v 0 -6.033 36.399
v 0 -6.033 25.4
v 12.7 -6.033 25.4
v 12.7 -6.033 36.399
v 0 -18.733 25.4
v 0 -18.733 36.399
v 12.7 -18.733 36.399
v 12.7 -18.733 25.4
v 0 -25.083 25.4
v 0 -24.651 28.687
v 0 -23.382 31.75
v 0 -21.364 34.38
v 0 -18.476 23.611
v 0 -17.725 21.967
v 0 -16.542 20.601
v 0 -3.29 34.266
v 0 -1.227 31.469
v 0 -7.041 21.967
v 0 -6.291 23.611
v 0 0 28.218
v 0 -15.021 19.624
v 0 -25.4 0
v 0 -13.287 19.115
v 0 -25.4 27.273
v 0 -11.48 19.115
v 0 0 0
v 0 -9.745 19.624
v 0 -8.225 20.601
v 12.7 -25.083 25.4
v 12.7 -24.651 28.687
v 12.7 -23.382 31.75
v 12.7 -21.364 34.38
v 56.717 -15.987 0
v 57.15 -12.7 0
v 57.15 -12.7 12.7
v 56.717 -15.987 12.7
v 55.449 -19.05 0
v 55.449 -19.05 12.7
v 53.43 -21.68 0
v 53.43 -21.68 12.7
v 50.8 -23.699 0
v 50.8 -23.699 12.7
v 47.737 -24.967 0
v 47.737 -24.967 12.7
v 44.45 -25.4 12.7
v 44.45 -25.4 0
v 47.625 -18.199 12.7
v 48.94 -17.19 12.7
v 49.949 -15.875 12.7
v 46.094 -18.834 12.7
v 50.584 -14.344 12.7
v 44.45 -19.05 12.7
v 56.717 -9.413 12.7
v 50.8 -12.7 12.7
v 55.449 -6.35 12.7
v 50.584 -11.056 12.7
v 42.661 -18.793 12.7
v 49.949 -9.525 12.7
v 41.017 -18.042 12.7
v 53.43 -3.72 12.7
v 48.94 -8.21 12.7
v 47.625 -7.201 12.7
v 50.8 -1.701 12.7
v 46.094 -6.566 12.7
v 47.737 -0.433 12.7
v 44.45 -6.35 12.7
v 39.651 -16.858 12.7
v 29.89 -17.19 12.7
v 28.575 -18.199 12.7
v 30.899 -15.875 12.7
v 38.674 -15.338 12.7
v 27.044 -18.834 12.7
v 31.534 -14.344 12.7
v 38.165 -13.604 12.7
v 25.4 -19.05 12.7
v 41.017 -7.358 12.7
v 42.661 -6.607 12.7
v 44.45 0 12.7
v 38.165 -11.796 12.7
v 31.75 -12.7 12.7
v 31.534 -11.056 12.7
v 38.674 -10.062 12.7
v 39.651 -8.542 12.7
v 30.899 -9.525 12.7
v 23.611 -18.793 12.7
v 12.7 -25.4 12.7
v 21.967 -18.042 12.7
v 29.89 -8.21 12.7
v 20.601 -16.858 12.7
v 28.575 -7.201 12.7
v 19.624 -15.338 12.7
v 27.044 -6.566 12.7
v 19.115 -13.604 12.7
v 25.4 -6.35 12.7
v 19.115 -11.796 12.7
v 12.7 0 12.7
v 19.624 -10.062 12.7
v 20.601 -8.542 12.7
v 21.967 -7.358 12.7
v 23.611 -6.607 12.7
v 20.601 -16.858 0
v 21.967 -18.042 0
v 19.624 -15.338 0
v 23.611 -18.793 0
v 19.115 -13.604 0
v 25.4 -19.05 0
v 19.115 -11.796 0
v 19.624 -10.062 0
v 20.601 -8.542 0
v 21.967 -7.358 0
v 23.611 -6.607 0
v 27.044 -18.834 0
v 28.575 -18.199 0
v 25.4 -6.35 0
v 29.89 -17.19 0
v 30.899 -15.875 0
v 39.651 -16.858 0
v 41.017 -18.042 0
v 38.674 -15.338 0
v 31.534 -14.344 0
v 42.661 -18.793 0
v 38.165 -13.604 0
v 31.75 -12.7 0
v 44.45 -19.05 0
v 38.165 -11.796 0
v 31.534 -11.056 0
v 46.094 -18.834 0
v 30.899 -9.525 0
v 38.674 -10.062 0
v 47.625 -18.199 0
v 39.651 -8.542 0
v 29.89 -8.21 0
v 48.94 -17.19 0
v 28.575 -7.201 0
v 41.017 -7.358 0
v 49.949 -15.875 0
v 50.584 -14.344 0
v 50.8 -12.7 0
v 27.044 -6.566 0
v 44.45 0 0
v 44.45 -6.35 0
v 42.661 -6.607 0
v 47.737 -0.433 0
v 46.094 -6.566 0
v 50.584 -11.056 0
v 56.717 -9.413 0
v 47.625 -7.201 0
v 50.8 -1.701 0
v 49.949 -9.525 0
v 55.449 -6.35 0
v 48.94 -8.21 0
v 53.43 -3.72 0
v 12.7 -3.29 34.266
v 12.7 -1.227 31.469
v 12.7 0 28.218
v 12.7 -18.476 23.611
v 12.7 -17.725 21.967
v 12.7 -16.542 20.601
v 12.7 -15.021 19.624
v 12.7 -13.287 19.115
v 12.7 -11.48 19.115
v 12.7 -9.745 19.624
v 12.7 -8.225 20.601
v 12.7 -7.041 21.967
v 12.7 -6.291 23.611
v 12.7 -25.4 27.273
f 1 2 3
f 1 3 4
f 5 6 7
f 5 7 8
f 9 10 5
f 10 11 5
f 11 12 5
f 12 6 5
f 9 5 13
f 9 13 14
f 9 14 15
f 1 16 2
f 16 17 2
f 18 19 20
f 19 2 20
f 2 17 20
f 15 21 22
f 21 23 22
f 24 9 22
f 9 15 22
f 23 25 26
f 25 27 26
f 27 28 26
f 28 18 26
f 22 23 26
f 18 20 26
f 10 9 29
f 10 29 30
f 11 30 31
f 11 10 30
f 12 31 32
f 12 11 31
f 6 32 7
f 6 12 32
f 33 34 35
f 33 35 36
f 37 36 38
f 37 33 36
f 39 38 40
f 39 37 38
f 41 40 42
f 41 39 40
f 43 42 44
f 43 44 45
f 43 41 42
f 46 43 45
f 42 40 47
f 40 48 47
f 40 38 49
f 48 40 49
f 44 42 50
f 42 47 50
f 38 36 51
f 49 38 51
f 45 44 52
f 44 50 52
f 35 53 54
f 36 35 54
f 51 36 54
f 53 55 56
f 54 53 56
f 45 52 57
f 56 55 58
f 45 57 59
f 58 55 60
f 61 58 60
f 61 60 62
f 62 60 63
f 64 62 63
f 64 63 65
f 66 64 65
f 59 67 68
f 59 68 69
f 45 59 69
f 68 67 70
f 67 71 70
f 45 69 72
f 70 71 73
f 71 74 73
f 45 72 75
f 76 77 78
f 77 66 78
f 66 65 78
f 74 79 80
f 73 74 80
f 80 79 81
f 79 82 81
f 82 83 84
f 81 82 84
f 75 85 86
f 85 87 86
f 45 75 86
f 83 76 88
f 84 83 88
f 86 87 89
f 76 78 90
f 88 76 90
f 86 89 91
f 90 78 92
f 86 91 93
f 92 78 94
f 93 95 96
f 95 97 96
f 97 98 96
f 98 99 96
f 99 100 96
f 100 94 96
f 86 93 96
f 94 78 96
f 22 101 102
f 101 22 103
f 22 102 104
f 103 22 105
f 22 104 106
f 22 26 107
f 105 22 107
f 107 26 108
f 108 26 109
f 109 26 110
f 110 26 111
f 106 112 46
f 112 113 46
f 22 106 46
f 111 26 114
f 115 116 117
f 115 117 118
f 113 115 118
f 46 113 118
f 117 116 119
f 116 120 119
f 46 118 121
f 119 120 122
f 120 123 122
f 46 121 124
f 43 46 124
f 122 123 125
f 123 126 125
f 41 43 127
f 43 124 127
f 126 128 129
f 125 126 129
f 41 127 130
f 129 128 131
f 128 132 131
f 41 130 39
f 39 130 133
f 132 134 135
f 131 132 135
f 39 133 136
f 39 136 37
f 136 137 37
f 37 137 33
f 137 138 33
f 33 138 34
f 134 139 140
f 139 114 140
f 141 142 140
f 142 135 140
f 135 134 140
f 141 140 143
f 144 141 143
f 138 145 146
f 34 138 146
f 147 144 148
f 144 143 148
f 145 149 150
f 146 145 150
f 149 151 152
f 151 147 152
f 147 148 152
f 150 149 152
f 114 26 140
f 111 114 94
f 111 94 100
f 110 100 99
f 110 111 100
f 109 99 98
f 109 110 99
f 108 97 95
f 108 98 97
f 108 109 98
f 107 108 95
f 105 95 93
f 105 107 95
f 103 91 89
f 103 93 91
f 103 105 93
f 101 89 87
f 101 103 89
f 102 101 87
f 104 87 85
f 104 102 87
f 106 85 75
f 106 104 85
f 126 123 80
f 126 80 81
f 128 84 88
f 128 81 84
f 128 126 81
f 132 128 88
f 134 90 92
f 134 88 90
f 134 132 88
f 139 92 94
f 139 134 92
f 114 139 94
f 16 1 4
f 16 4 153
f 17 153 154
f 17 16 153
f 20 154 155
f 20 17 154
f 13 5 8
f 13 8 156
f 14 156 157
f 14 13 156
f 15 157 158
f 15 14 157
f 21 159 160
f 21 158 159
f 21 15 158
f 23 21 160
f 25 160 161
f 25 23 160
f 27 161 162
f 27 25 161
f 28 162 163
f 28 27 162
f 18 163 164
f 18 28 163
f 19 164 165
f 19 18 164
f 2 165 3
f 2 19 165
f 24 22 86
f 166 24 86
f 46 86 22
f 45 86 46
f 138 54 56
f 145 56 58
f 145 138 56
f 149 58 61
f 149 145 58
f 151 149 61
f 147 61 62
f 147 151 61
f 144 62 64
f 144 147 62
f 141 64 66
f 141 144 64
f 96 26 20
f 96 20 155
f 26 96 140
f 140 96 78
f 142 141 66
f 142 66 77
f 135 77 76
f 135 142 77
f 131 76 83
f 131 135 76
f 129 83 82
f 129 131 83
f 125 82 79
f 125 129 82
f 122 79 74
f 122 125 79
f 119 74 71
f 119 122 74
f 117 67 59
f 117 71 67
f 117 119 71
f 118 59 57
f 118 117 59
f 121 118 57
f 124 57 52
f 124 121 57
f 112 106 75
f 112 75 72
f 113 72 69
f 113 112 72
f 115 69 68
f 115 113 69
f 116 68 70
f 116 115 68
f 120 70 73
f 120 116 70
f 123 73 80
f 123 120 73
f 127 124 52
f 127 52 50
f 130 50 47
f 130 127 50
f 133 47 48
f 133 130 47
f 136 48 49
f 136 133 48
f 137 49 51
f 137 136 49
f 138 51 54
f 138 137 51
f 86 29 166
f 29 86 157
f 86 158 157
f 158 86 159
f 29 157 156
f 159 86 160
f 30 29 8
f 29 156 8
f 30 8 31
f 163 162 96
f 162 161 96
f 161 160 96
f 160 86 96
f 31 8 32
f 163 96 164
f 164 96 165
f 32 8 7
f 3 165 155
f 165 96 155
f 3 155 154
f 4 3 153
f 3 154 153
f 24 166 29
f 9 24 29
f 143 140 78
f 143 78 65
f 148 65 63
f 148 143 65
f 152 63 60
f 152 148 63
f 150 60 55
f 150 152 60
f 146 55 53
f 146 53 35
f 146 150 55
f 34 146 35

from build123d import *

# Parameters (mm, degrees)
F1_DEPTH = 25.4
F3_DEPTH = 25.4
F5_DEPTH = 25.4


# Not quite as in the source:
# - a feature names something its author has since deleted; it is built from what else it names


with BuildPart() as f1:
    # F0 (on Front) → F1 (new body)
    with BuildSketch(Plane.XZ):
        Polygon((0, 38.1), (0, 0), (57.15, 0), (57.15, 12.7), (12.7, 12.7), (12.7, 38.1), align=None)
    extrude(amount=F1_DEPTH)

    # F2 (on Top) → F3 (cut)
    with BuildSketch(Plane.XY):
        with BuildLine():
            Line((25.4, -19.05), (25.4, -6.35))
            ThreePointArc((25.4, -6.35), (19.05, -12.7), (25.4, -19.05))
        make_face()
        with BuildLine():
            ThreePointArc((25.4, -19.05), (29.8901280605, -17.1901280605), (31.75, -12.7))
            ThreePointArc((31.75, -12.7), (29.8901280605, -8.2098719395), (25.4, -6.35))
            Line((25.4, -6.35), (25.4, -19.05))
        make_face()
        with BuildLine():
            Line((44.45, -19.05), (44.45, -6.35))
            ThreePointArc((44.45, -6.35), (38.1, -12.7), (44.45, -19.05))
        make_face()
        with BuildLine():
            ThreePointArc((50.8, -12.7), (48.9401280605, -8.2098719395), (44.45, -6.35))
            Line((44.45, -6.35), (44.45, -19.05))
            ThreePointArc((44.45, -19.05), (48.9401280605, -17.1901280605), (50.8, -12.7))
        make_face()
        with BuildLine():
            Line((57.15, -25.4), (57.15, -12.7))
            ThreePointArc((57.15, -12.7), (53.4302561211, -21.6802561211), (44.45, -25.4))
            Line((44.45, -25.4), (57.15, -25.4))
        make_face()
        with BuildLine():
            Line((57.15, 0), (44.45, 0))
            ThreePointArc((44.45, 0), (53.4302561211, -3.7197438789), (57.15, -12.7))
            Line((57.15, -12.7), (57.15, 0))
        make_face()
    extrude(amount=F3_DEPTH, mode=Mode.SUBTRACT)

    # F4 (on Right) → F5 (cut)
    with BuildSketch(Plane.YZ):
        with BuildLine():
            ThreePointArc((-18.7333624887, 25.4), (-12.3833624887, 19.05), (-6.0333624887, 25.4))
            ThreePointArc((-6.0333624887, 25.4), (-12.3833624887, 31.75), (-18.7333624887, 25.4))
        make_face()
        with BuildLine():
            ThreePointArc((-18.7333624887, 25.4), (-12.3833624887, 31.75), (-6.0333624887, 25.4))
            Line((-6.0333624887, 25.4), (-6.0333624887, 36.3985226281))
            ThreePointArc((-6.0333624887, 36.3985226281), (-9.0963606159, 37.6672579939), (-12.3833624887, 38.1))
            ThreePointArc((-12.3833624887, 38.1), (-15.6703643615, 37.6672579939), (-18.7333624887, 36.3985226281))
            Line((-18.7333624887, 36.3985226281), (-18.7333624887, 25.4))
        make_face()
        with BuildLine():
            ThreePointArc((-12.3833624887, 38.1), (-9.0963606159, 37.6672579939), (-6.0333624887, 36.3985226281))
            Line((-6.0333624887, 36.3985226281), (-6.0333624887, 38.1))
            Line((-6.0333624887, 38.1), (-12.3833624887, 38.1))
        make_face()
        with BuildLine():
            Line((-6.0333624887, 38.1), (-6.0333624887, 36.3985226281))
            ThreePointArc((-6.0333624887, 36.3985226281), (-1.3848398607, 31.75), (0.3166375113, 25.4))
            Line((0.3166375113, 25.4), (0.3166375113, 40.4268426491))
            Line((0.3166375113, 40.4268426491), (-27.6233624887, 40.4268426491))
            Line((-27.6233624887, 40.4268426491), (-25.0833624887, 25.4))
            ThreePointArc((-25.0833624887, 25.4), (-23.3818851168, 31.75), (-18.7333624887, 36.3985226281))
            Line((-18.7333624887, 36.3985226281), (-18.7333624887, 38.1))
            Line((-18.7333624887, 38.1), (-12.3833624887, 38.1))
            Line((-12.3833624887, 38.1), (-6.0333624887, 38.1))
        make_face()
        with BuildLine():
            Line((-18.7333624887, 38.1), (-18.7333624887, 36.3985226281))
            ThreePointArc((-18.7333624887, 36.3985226281), (-15.6703643615, 37.6672579939), (-12.3833624887, 38.1))
            Line((-12.3833624887, 38.1), (-18.7333624887, 38.1))
        make_face()
    extrude(amount=F5_DEPTH, mode=Mode.SUBTRACT)


solid = f1.part
